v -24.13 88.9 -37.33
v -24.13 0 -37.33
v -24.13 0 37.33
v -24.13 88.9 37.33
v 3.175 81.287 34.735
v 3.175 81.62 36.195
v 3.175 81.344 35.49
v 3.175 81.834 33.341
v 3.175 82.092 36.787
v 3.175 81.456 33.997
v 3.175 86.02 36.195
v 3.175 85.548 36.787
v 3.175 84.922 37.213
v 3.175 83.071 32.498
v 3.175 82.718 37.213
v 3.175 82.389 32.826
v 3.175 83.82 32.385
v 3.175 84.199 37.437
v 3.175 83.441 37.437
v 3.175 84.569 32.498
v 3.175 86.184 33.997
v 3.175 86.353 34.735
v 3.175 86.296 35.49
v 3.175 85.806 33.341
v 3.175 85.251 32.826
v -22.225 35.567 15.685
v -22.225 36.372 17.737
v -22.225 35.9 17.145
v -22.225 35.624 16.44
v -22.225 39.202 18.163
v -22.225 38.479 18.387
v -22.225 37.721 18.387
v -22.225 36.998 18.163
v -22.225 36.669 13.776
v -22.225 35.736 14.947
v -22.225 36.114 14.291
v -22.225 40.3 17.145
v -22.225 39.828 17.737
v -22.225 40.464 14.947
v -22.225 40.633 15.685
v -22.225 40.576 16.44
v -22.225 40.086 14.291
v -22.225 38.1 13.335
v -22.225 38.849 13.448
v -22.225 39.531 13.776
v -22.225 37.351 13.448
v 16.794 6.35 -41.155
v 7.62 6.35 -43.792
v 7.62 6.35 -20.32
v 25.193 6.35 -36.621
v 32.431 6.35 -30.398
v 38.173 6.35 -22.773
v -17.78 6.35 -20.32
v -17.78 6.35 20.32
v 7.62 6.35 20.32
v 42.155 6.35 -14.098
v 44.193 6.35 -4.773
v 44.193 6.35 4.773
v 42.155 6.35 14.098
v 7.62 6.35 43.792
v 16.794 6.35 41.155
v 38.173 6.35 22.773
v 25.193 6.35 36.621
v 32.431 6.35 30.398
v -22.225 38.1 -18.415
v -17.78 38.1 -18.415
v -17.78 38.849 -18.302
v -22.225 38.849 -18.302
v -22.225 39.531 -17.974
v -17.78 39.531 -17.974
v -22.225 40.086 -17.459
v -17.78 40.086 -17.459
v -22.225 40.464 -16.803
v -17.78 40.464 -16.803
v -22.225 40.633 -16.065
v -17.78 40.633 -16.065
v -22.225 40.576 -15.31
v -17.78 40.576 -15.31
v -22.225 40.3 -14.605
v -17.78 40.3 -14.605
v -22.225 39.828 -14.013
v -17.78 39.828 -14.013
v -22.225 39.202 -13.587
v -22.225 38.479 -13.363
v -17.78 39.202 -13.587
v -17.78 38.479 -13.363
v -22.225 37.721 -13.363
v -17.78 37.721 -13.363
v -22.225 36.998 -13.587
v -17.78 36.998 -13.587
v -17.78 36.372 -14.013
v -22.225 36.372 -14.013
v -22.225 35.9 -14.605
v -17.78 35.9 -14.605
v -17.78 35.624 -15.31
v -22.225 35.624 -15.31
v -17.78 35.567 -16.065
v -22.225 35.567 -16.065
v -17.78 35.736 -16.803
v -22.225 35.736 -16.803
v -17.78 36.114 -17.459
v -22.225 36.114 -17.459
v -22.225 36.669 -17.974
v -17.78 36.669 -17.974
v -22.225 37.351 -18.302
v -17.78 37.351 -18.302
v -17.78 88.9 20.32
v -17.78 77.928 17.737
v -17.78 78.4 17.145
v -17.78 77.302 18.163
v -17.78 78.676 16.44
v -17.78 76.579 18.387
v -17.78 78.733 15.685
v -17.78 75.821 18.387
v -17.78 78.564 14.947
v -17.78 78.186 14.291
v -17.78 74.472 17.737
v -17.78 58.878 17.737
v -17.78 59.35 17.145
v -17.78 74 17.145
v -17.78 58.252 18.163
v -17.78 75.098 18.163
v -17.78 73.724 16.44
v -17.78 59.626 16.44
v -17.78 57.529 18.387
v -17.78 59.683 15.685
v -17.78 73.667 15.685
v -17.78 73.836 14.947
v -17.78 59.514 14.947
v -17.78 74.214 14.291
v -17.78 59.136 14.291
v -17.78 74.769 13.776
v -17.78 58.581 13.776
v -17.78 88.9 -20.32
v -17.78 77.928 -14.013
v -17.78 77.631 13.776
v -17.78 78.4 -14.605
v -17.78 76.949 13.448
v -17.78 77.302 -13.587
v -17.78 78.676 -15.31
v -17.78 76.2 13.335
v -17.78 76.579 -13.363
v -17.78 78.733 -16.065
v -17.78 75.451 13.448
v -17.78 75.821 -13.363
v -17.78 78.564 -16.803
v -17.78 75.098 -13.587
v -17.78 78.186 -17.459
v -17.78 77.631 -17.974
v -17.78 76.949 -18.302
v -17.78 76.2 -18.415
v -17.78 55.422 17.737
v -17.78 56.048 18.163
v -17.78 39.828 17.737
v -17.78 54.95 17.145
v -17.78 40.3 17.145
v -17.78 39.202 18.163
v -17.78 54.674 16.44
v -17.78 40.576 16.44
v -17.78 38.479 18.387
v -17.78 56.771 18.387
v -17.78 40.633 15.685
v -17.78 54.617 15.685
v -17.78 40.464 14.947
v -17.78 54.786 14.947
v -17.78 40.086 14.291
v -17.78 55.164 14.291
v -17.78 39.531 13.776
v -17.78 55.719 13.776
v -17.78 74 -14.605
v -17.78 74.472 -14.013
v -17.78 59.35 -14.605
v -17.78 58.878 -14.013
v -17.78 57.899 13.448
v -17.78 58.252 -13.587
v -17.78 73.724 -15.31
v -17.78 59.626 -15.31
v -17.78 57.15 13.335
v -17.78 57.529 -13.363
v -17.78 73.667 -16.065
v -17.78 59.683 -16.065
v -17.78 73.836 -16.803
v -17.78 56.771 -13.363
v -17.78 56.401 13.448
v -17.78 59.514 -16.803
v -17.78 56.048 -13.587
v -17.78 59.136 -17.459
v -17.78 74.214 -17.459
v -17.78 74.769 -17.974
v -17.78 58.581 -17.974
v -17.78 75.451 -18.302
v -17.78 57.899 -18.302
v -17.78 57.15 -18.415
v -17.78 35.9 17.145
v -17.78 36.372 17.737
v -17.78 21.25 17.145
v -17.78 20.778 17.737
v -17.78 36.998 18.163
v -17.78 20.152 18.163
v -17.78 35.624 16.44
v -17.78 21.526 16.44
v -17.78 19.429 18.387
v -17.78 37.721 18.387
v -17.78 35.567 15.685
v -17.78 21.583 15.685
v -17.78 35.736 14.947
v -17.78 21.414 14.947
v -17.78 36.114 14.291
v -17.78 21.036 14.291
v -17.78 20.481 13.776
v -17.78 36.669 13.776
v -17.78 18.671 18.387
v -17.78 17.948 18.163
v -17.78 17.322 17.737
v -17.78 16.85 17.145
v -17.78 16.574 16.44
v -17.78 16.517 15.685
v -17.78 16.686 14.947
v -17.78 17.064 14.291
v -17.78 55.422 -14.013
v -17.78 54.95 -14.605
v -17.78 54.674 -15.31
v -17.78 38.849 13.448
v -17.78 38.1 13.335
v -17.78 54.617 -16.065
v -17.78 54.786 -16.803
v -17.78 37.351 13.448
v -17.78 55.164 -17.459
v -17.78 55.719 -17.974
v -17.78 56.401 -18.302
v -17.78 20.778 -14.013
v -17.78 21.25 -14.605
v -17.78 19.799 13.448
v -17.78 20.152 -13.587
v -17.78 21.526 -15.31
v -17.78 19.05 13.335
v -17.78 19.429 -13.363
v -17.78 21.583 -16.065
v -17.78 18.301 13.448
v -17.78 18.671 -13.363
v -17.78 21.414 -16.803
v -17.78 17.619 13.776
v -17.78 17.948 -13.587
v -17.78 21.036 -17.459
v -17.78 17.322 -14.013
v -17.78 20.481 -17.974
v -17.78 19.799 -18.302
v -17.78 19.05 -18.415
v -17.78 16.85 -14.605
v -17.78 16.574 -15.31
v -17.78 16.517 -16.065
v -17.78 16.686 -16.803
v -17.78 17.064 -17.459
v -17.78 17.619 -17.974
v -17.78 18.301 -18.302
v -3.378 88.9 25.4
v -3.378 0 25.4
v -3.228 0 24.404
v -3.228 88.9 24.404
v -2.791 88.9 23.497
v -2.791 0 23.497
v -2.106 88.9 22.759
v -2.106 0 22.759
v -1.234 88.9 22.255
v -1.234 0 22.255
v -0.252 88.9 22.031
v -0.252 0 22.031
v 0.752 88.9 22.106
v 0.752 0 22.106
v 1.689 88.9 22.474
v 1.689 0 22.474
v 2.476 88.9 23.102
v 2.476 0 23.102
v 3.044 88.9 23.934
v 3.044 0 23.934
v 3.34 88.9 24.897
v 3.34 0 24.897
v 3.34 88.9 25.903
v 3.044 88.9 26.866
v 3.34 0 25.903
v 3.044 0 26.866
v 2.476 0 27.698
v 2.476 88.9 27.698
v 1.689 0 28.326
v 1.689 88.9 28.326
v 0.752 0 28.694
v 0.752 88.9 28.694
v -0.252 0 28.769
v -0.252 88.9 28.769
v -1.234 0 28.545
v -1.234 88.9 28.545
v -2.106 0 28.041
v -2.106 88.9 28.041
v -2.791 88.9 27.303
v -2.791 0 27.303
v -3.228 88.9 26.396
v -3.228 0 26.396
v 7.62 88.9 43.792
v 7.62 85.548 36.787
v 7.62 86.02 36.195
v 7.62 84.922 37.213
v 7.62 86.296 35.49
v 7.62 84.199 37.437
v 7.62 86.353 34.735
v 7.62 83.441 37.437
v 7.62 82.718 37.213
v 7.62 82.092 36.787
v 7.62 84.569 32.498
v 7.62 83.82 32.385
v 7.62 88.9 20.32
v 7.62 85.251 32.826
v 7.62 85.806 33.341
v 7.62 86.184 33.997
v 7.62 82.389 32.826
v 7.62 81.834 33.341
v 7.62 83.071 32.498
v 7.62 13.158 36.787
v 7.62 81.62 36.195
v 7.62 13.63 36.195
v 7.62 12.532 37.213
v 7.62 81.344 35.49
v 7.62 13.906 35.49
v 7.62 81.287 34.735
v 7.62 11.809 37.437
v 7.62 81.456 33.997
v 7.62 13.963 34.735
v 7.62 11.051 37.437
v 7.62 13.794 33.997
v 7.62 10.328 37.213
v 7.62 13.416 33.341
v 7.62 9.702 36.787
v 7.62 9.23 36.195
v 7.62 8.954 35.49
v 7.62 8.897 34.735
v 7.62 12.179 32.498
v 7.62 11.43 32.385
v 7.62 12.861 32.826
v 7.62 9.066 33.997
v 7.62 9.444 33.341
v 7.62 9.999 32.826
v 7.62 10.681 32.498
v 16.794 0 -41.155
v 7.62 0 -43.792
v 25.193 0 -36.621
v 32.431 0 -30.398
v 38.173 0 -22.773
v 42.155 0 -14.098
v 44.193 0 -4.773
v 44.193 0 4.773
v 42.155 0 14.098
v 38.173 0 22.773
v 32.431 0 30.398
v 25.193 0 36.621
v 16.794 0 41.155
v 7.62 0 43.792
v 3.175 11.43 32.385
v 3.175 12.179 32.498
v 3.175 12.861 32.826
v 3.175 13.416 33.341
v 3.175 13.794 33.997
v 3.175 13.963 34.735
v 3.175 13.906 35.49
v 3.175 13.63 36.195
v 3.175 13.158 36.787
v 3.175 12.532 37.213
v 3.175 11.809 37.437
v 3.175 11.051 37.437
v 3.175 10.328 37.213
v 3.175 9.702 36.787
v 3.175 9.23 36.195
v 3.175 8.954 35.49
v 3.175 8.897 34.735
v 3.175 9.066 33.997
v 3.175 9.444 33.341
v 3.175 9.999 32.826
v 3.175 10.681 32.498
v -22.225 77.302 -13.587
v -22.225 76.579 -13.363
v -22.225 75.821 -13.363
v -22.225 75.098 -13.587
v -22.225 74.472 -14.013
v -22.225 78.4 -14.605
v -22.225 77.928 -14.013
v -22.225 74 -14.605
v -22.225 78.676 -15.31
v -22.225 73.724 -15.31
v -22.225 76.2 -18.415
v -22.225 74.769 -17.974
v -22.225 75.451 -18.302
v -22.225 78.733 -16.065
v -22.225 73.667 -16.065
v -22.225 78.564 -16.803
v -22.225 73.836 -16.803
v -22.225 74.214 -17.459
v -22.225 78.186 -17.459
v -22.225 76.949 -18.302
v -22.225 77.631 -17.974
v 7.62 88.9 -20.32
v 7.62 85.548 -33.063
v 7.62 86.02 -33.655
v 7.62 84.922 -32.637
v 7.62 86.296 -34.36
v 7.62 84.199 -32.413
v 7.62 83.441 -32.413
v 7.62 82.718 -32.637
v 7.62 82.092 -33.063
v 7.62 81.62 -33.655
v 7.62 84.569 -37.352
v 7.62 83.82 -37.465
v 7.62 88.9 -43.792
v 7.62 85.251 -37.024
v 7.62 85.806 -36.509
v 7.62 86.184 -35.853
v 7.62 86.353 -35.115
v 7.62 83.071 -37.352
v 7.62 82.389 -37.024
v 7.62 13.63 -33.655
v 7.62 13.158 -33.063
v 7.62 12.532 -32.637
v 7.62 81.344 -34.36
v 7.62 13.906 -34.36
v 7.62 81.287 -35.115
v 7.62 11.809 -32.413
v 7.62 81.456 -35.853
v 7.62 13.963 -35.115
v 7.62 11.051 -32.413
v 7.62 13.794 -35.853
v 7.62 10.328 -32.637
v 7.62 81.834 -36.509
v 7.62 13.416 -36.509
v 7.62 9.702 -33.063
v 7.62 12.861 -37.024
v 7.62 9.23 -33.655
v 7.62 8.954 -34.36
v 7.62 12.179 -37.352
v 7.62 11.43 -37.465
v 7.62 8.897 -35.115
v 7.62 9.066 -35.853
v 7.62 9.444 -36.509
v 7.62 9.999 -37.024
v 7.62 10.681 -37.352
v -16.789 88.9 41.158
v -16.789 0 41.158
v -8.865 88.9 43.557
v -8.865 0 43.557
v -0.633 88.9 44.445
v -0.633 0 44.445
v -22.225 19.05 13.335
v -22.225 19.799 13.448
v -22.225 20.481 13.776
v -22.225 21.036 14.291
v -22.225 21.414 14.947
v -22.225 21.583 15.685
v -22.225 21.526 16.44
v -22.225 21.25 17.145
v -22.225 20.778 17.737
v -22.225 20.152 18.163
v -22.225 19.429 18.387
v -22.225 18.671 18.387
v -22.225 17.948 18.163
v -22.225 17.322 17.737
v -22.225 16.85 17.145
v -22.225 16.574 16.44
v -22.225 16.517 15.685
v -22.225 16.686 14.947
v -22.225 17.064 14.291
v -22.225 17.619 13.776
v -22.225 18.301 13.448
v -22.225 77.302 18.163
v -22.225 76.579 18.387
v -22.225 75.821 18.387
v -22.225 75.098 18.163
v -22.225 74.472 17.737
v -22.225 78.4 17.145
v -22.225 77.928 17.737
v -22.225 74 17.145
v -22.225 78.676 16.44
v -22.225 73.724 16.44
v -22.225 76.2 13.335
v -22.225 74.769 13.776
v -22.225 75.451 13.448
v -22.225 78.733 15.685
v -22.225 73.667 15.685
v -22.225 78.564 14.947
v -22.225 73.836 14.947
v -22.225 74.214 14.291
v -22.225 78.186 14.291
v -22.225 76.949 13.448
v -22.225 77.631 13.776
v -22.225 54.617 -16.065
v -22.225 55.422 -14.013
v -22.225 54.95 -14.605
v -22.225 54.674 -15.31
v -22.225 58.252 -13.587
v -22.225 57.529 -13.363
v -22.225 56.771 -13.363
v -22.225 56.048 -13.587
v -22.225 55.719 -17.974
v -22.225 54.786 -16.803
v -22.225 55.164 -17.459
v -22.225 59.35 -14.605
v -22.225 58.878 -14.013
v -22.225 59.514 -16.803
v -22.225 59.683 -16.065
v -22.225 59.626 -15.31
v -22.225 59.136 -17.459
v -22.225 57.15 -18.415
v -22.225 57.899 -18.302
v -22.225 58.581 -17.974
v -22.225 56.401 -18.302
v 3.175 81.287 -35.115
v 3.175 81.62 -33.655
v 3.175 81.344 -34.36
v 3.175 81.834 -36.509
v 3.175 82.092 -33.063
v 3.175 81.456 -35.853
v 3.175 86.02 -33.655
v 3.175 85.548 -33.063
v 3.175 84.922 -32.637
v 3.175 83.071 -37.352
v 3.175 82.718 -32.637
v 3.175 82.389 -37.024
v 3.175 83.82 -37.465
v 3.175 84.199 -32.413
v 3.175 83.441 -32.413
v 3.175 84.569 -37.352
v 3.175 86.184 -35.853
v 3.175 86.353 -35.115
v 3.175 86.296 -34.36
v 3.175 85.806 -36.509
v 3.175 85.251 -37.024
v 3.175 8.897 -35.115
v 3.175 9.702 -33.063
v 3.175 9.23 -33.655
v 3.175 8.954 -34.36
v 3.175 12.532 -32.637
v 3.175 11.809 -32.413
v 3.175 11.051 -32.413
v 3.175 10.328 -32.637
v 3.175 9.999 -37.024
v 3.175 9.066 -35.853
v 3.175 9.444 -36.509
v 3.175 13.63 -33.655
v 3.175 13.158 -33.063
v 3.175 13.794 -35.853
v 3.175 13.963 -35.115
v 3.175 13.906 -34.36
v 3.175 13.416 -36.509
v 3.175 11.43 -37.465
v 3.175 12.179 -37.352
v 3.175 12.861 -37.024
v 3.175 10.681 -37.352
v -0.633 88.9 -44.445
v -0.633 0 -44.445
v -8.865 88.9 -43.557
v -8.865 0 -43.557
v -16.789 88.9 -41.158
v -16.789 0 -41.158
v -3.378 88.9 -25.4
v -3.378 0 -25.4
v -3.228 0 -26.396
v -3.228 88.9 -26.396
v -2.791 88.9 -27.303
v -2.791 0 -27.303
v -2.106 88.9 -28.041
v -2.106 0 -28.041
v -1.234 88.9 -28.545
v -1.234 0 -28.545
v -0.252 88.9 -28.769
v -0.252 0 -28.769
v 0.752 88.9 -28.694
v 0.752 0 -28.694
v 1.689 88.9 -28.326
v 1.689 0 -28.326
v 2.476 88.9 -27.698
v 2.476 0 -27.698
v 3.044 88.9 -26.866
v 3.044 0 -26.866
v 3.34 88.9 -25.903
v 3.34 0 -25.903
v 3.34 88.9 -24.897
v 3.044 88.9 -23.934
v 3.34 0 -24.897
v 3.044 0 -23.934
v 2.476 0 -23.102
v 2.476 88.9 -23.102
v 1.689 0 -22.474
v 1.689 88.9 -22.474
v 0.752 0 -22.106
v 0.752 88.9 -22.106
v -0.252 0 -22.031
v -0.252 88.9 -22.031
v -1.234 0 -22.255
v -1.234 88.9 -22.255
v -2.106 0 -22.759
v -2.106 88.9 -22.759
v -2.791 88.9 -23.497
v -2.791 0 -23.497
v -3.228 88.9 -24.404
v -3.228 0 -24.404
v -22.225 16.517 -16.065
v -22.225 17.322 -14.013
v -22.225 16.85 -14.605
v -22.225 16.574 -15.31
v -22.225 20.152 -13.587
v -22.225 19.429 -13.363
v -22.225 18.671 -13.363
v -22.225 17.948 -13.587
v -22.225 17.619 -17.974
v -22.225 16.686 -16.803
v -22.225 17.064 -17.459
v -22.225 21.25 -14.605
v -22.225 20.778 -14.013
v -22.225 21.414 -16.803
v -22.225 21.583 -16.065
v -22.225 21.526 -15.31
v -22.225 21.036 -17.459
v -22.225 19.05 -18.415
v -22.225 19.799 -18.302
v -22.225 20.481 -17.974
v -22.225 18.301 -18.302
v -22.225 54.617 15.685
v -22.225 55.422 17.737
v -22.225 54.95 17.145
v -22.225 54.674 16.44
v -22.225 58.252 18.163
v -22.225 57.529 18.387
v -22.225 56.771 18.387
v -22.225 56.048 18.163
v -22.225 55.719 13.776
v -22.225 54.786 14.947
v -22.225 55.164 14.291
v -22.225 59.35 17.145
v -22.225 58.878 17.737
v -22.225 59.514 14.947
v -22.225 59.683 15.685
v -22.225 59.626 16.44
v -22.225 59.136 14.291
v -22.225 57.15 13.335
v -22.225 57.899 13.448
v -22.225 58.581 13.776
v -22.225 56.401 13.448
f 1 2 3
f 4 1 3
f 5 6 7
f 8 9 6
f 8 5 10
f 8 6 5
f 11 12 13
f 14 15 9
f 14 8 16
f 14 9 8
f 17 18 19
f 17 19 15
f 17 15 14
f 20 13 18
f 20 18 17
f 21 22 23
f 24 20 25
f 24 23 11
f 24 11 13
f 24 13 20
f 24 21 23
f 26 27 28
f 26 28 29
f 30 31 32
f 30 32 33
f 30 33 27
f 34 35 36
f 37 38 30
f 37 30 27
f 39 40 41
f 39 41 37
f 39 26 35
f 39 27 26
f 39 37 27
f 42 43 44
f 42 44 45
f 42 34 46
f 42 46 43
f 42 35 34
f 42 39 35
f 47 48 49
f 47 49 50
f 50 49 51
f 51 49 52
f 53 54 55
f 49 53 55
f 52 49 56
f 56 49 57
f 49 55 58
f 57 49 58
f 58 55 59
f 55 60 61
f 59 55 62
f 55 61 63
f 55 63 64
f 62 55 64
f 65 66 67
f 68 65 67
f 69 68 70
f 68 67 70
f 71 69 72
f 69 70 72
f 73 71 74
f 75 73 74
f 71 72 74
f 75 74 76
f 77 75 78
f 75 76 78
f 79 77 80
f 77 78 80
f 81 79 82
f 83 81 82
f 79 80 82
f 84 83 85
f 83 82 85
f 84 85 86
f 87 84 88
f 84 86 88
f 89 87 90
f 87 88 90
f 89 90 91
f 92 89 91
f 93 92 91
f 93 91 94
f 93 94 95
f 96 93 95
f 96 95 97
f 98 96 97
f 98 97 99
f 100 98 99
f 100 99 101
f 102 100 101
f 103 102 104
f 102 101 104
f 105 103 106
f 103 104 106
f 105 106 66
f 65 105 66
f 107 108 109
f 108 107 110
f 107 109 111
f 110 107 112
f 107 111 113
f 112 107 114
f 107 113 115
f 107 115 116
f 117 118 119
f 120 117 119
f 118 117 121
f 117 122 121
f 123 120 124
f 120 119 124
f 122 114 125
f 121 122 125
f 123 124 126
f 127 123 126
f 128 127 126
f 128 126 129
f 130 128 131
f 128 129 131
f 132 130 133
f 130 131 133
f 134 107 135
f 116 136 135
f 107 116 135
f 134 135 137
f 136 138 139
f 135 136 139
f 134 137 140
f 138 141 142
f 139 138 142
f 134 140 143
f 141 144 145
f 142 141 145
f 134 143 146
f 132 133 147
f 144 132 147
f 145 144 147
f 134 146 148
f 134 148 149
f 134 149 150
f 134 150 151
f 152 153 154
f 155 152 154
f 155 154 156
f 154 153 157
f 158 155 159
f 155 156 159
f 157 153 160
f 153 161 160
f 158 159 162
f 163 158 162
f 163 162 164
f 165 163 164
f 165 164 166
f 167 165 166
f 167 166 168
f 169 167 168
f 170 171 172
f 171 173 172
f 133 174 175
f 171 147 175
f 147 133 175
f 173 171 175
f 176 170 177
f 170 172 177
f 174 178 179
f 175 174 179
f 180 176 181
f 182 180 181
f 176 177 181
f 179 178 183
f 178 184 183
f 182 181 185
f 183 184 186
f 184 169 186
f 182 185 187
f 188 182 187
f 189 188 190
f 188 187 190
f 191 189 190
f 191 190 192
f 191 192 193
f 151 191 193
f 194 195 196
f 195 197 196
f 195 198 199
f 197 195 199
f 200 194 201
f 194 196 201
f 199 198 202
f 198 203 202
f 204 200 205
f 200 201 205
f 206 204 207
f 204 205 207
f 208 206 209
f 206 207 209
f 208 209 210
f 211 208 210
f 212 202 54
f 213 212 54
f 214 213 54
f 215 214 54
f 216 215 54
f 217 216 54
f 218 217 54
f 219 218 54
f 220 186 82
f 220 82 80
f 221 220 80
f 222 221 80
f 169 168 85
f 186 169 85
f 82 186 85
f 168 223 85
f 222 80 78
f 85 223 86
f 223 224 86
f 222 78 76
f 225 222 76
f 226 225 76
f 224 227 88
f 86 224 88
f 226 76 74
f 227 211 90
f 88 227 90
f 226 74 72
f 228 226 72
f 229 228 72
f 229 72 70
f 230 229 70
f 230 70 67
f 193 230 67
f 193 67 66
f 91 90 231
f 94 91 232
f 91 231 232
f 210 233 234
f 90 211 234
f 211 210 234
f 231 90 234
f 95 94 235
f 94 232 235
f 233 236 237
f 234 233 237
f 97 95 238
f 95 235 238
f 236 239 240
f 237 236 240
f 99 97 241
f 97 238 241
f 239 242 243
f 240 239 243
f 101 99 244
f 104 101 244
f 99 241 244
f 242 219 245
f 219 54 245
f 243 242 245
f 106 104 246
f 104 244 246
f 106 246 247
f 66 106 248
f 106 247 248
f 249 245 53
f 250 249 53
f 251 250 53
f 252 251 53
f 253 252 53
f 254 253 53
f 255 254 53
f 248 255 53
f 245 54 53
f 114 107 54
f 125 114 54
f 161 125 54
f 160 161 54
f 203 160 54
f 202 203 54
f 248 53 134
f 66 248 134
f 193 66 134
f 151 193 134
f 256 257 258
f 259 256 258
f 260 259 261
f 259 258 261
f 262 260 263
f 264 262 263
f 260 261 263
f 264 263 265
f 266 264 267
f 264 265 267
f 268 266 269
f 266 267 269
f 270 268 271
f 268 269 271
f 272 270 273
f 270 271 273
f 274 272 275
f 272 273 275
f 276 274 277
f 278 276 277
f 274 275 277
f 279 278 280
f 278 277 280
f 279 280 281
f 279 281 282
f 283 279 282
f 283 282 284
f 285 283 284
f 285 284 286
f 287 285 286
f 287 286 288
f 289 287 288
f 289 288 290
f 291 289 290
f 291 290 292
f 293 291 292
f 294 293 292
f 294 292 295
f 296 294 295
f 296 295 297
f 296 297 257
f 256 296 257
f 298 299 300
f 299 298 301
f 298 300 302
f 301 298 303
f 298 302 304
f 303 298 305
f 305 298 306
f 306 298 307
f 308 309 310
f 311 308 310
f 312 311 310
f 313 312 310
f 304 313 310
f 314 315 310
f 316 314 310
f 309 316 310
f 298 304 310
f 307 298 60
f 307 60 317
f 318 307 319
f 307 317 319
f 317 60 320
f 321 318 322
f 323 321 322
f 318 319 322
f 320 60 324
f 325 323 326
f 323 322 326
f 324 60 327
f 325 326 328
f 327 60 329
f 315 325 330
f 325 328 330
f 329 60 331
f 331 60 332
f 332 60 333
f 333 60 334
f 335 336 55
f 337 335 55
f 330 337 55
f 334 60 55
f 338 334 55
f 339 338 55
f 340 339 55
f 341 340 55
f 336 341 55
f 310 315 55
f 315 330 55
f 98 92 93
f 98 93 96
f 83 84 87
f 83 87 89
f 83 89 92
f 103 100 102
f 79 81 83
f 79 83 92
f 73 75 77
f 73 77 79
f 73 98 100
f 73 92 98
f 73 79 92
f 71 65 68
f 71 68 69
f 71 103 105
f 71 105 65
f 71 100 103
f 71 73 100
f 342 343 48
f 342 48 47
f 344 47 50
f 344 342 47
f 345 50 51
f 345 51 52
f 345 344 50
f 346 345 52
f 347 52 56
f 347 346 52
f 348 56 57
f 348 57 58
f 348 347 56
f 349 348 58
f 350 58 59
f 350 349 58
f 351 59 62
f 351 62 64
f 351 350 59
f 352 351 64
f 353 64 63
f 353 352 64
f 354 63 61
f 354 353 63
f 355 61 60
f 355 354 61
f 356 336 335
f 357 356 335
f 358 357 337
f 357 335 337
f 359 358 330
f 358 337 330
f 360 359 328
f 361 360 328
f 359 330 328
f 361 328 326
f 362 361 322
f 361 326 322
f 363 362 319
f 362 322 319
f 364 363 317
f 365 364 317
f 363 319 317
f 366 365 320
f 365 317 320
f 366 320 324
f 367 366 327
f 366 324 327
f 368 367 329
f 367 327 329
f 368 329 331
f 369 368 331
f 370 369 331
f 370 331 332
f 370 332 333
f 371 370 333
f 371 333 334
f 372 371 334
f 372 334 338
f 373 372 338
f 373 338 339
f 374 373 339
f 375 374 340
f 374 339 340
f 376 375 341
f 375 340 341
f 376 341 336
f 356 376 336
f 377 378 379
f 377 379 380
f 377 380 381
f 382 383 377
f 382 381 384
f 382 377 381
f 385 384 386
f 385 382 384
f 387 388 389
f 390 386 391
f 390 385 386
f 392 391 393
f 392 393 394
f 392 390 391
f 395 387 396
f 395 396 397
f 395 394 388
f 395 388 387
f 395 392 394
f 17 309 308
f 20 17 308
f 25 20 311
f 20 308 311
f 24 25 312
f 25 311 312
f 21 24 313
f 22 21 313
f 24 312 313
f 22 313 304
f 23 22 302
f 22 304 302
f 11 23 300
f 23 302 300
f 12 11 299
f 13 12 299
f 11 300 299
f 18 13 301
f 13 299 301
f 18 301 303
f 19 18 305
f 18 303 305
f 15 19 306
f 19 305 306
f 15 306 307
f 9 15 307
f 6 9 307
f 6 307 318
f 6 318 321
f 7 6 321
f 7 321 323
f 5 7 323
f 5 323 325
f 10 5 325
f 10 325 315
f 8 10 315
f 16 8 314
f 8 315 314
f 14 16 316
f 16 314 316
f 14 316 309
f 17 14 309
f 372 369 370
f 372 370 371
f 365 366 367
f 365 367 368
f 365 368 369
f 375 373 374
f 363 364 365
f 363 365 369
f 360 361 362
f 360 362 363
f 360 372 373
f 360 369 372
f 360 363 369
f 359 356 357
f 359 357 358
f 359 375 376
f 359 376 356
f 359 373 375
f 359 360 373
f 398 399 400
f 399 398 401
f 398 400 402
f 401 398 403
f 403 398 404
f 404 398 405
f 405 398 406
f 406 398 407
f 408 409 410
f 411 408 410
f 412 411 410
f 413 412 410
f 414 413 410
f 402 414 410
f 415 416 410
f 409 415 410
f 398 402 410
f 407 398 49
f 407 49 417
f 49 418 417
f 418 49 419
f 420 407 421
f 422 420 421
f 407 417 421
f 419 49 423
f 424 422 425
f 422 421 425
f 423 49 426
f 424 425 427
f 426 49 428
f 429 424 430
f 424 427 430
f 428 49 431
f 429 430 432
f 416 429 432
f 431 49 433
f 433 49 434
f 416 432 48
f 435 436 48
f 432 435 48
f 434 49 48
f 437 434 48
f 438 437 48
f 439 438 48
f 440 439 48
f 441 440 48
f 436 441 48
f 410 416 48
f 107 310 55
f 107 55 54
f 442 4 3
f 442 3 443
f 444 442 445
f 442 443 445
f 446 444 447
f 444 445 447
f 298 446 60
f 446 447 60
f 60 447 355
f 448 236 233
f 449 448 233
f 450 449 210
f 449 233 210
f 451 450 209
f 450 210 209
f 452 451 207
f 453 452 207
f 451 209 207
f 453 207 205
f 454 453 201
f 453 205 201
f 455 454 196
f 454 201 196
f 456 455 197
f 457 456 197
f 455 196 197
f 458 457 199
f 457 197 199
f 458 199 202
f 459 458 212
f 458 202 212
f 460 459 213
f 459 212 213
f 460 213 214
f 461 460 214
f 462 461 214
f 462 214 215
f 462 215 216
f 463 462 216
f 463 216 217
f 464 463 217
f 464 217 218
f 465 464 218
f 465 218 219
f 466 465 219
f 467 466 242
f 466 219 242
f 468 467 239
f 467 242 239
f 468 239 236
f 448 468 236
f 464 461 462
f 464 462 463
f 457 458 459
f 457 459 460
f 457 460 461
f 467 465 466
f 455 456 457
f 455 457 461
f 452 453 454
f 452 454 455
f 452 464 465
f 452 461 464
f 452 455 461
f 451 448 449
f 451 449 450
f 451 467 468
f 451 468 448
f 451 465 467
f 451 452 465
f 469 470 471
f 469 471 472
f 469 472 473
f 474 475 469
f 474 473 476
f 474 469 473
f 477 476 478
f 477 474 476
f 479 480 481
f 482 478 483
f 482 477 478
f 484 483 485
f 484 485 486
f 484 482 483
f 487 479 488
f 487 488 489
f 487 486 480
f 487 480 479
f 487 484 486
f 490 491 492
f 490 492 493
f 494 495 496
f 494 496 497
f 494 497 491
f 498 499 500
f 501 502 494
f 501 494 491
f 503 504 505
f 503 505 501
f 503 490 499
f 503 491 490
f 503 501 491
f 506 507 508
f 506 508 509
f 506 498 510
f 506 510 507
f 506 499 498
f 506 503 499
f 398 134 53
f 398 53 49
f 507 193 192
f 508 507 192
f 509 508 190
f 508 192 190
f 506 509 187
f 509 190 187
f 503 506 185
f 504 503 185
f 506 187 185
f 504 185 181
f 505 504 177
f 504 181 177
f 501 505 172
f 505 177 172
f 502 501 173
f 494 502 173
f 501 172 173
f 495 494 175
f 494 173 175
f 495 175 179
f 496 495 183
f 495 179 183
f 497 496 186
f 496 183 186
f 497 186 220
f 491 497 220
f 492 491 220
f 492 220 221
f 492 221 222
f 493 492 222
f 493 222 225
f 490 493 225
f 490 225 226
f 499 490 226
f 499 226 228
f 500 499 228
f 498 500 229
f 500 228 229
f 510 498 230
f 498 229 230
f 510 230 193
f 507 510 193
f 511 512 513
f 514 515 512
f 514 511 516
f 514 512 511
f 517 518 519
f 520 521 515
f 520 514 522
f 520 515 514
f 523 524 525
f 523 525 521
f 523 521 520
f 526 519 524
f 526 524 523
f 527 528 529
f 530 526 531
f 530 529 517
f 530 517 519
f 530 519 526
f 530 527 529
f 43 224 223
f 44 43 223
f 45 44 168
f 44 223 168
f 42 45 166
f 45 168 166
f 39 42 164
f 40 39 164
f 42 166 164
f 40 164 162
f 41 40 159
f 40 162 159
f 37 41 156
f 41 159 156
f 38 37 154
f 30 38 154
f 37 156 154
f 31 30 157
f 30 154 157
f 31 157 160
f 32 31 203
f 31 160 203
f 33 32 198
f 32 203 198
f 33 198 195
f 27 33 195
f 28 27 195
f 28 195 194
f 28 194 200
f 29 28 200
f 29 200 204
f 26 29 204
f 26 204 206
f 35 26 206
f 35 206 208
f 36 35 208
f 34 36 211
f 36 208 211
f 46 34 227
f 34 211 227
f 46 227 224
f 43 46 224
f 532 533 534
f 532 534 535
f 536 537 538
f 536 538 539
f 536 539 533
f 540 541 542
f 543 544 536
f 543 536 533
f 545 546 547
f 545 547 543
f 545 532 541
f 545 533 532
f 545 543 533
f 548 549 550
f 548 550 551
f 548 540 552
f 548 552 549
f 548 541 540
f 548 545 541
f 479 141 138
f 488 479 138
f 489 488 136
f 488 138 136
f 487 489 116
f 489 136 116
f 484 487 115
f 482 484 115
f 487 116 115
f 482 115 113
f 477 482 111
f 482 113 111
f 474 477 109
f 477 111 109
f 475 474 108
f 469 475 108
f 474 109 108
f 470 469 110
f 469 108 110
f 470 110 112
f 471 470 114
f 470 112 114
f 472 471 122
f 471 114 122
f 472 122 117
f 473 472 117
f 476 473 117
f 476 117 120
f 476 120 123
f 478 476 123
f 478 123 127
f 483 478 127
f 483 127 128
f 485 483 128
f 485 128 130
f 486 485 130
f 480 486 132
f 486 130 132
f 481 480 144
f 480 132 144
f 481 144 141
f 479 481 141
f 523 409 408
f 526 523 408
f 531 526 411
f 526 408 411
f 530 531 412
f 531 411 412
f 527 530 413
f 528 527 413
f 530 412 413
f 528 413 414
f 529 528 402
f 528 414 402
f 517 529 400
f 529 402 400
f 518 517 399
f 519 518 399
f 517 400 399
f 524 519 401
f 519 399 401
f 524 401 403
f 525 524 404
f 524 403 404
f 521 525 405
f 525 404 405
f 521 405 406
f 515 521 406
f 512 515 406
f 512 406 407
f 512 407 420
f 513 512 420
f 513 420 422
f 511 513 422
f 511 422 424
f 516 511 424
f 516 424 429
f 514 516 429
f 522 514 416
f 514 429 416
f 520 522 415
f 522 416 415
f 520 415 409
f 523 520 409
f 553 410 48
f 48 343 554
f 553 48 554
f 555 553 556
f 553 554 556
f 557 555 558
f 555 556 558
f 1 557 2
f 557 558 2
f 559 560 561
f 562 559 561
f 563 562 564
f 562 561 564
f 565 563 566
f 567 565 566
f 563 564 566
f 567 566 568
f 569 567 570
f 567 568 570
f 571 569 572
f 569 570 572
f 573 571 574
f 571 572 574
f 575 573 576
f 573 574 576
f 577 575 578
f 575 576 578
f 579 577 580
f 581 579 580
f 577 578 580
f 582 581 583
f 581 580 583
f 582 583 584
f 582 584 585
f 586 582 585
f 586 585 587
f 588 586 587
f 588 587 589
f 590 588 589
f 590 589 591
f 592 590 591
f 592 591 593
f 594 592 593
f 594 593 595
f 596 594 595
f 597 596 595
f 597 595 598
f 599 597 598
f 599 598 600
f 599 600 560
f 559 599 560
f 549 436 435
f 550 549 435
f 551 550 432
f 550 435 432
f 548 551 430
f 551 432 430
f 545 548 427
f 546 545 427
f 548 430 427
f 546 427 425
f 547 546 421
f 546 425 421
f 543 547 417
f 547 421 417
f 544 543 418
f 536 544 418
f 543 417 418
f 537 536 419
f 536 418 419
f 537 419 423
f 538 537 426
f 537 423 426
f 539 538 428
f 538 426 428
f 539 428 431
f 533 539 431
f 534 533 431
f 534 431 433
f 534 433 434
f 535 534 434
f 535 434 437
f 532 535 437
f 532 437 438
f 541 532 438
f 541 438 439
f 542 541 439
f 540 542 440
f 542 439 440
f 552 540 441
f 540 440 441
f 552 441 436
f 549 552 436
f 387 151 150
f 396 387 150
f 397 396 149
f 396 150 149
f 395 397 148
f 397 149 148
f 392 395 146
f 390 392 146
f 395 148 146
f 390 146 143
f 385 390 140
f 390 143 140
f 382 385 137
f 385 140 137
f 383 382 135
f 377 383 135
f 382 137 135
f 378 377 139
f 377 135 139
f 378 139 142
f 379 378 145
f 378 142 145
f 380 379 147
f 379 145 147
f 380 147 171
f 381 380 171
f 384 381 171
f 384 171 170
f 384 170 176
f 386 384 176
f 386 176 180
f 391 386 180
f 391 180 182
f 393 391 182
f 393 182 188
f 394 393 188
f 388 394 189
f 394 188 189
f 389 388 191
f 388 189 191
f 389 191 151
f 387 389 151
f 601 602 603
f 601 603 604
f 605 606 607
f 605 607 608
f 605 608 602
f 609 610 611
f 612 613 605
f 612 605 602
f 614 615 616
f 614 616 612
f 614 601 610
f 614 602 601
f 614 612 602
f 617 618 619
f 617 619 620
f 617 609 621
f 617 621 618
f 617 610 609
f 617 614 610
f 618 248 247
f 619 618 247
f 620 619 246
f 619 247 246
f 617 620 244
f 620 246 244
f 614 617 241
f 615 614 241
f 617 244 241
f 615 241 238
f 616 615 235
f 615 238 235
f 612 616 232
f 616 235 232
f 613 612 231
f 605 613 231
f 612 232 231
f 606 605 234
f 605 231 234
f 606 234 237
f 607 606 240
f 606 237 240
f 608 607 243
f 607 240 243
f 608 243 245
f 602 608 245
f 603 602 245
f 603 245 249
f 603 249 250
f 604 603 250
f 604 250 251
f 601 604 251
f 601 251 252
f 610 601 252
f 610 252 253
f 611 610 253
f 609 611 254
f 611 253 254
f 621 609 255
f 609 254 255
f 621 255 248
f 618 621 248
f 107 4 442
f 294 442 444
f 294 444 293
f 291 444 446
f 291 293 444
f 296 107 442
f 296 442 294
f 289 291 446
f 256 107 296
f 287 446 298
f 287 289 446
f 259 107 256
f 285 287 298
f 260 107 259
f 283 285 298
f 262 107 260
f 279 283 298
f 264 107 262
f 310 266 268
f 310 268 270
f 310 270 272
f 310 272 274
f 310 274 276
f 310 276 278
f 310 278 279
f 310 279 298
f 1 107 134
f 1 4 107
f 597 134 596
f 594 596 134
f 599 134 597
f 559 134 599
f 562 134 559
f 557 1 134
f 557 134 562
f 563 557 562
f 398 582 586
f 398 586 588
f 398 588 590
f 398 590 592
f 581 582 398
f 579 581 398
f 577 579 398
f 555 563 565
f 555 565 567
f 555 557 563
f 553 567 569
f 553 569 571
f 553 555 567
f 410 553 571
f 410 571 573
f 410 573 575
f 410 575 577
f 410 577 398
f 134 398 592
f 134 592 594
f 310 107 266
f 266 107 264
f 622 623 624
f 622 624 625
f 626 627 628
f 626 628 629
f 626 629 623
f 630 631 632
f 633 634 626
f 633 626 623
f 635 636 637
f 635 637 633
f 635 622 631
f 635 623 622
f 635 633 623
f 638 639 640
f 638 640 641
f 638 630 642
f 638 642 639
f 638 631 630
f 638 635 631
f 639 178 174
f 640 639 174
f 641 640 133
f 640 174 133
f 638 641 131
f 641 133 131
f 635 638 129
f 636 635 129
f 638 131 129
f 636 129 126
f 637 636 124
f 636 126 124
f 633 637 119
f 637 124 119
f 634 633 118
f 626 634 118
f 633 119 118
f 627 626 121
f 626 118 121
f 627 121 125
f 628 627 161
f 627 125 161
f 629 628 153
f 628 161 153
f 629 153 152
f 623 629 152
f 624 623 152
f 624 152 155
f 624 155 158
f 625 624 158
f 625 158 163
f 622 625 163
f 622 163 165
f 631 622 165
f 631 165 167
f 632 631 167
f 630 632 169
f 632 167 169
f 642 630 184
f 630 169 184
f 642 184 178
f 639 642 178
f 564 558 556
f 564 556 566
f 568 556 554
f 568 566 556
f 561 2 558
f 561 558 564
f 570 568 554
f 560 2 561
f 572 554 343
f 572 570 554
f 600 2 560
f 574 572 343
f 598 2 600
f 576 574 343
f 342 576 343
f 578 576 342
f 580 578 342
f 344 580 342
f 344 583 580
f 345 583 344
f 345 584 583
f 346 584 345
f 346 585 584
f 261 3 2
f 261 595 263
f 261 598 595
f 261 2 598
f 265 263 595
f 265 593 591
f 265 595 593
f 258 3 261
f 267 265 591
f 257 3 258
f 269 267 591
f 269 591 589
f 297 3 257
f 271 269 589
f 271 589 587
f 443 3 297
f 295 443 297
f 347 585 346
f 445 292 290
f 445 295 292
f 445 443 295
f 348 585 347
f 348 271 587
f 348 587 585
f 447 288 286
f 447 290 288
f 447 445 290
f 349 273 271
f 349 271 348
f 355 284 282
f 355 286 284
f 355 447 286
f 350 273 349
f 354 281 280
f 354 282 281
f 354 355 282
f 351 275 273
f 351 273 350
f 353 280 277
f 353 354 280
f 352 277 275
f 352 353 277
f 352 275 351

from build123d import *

# Parameters (mm, degrees)
BOSS_EXTRUDE1_DEPTH     = 88.9
SKETCH2_R               = 2.54
CUT_EXTRUDE1_DEPTH      = 4.445
F_1_4_CLEARANCE_HOLE1_D = 6.7564
BOSS_EXTRUDE3_DEPTH     = 6.35
SKETCH8_R               = 2.54
CUT_EXTRUDE2_DEPTH      = 4.445


with BuildPart() as part:
    # Sketch1 → Boss-Extrude1 (new body)
    with BuildSketch(Plane(origin=(0, 0, 0), x_dir=(1, 0, 0), z_dir=(0, 1, 0))):
        with BuildLine():
            Line((-17.78, 20.32), (7.62, 20.32))
            Line((7.62, 20.32), (7.62, 43.79198671))
            ThreePointArc((7.62, 43.79198671), (-8.864740287, 43.557076114), (-24.13, 37.33022368))
            Line((-24.13, 37.33022368), (-24.13, -37.33022368))
            ThreePointArc((-24.13, -37.33022368), (-8.864740287, -43.557076114), (7.62, -43.79198671))
            Line((7.62, -43.79198671), (7.62, -20.32))
            Line((7.62, -20.32), (-17.78, -20.32))
            Line((-17.78, -20.32), (-17.78, 20.32))
        make_face()
    extrude(amount=BOSS_EXTRUDE1_DEPTH)

    # Sketch2 → Cut-Extrude1 (cut)
    with BuildSketch(Plane(origin=(-17.78, 0, 0), x_dir=(0, 0, -1), z_dir=(1, 0, 0))):
        with Locations((-15.875, 76.2)):
            Circle(SKETCH2_R)
        with Locations((15.875, 76.2)):
            Circle(SKETCH2_R)
        with Locations((-15.875, 57.15)):
            Circle(SKETCH2_R)
        with Locations((15.875, 57.15)):
            Circle(SKETCH2_R)
        with Locations((-15.875, 38.1)):
            Circle(SKETCH2_R)
        with Locations((15.875, 38.1)):
            Circle(SKETCH2_R)
        with Locations((-15.875, 19.05)):
            Circle(SKETCH2_R)
        with Locations((15.875, 19.05)):
            Circle(SKETCH2_R)
    extrude(amount=-CUT_EXTRUDE1_DEPTH, mode=Mode.SUBTRACT)

    # 1/4 Clearance Hole1 (through all)
    with Locations(Plane(origin=(0, 88.9, 0), x_dir=(1, 0, 0), z_dir=(0, 1, 0))):
        with Locations((0, -25.4), (0, 25.4)):
            Hole(F_1_4_CLEARANCE_HOLE1_D / 2)

    # Sketch7 → Boss-Extrude3 (add)
    with BuildSketch(Plane.XZ):
        with BuildLine():
            Line((7.62, -20.32), (7.62, -43.79198671))
            ThreePointArc((7.62, -43.79198671), (44.45, 0), (7.62, 43.79198671))
            Line((7.62, 43.79198671), (7.62, 20.32))
            Line((7.62, 20.32), (-17.78, 20.32))
            Line((-17.78, 20.32), (-17.78, -20.32))
            Line((-17.78, -20.32), (7.62, -20.32))
        make_face()
    extrude(amount=-BOSS_EXTRUDE3_DEPTH)

    # Sketch8 → Cut-Extrude2 (cut)
    with BuildSketch(Plane(origin=(7.62, 0, 0), x_dir=(0, 0, -1), z_dir=(1, 0, 0))):
        with Locations((-34.925, 83.82)):
            Circle(SKETCH8_R)
        with Locations((34.925, 83.82)):
            Circle(SKETCH8_R)
        with Locations((-34.925, 11.43)):
            Circle(SKETCH8_R)
        with Locations((34.925, 11.43)):
            Circle(SKETCH8_R)
    extrude(amount=-CUT_EXTRUDE2_DEPTH, mode=Mode.SUBTRACT)


solid = part.part
